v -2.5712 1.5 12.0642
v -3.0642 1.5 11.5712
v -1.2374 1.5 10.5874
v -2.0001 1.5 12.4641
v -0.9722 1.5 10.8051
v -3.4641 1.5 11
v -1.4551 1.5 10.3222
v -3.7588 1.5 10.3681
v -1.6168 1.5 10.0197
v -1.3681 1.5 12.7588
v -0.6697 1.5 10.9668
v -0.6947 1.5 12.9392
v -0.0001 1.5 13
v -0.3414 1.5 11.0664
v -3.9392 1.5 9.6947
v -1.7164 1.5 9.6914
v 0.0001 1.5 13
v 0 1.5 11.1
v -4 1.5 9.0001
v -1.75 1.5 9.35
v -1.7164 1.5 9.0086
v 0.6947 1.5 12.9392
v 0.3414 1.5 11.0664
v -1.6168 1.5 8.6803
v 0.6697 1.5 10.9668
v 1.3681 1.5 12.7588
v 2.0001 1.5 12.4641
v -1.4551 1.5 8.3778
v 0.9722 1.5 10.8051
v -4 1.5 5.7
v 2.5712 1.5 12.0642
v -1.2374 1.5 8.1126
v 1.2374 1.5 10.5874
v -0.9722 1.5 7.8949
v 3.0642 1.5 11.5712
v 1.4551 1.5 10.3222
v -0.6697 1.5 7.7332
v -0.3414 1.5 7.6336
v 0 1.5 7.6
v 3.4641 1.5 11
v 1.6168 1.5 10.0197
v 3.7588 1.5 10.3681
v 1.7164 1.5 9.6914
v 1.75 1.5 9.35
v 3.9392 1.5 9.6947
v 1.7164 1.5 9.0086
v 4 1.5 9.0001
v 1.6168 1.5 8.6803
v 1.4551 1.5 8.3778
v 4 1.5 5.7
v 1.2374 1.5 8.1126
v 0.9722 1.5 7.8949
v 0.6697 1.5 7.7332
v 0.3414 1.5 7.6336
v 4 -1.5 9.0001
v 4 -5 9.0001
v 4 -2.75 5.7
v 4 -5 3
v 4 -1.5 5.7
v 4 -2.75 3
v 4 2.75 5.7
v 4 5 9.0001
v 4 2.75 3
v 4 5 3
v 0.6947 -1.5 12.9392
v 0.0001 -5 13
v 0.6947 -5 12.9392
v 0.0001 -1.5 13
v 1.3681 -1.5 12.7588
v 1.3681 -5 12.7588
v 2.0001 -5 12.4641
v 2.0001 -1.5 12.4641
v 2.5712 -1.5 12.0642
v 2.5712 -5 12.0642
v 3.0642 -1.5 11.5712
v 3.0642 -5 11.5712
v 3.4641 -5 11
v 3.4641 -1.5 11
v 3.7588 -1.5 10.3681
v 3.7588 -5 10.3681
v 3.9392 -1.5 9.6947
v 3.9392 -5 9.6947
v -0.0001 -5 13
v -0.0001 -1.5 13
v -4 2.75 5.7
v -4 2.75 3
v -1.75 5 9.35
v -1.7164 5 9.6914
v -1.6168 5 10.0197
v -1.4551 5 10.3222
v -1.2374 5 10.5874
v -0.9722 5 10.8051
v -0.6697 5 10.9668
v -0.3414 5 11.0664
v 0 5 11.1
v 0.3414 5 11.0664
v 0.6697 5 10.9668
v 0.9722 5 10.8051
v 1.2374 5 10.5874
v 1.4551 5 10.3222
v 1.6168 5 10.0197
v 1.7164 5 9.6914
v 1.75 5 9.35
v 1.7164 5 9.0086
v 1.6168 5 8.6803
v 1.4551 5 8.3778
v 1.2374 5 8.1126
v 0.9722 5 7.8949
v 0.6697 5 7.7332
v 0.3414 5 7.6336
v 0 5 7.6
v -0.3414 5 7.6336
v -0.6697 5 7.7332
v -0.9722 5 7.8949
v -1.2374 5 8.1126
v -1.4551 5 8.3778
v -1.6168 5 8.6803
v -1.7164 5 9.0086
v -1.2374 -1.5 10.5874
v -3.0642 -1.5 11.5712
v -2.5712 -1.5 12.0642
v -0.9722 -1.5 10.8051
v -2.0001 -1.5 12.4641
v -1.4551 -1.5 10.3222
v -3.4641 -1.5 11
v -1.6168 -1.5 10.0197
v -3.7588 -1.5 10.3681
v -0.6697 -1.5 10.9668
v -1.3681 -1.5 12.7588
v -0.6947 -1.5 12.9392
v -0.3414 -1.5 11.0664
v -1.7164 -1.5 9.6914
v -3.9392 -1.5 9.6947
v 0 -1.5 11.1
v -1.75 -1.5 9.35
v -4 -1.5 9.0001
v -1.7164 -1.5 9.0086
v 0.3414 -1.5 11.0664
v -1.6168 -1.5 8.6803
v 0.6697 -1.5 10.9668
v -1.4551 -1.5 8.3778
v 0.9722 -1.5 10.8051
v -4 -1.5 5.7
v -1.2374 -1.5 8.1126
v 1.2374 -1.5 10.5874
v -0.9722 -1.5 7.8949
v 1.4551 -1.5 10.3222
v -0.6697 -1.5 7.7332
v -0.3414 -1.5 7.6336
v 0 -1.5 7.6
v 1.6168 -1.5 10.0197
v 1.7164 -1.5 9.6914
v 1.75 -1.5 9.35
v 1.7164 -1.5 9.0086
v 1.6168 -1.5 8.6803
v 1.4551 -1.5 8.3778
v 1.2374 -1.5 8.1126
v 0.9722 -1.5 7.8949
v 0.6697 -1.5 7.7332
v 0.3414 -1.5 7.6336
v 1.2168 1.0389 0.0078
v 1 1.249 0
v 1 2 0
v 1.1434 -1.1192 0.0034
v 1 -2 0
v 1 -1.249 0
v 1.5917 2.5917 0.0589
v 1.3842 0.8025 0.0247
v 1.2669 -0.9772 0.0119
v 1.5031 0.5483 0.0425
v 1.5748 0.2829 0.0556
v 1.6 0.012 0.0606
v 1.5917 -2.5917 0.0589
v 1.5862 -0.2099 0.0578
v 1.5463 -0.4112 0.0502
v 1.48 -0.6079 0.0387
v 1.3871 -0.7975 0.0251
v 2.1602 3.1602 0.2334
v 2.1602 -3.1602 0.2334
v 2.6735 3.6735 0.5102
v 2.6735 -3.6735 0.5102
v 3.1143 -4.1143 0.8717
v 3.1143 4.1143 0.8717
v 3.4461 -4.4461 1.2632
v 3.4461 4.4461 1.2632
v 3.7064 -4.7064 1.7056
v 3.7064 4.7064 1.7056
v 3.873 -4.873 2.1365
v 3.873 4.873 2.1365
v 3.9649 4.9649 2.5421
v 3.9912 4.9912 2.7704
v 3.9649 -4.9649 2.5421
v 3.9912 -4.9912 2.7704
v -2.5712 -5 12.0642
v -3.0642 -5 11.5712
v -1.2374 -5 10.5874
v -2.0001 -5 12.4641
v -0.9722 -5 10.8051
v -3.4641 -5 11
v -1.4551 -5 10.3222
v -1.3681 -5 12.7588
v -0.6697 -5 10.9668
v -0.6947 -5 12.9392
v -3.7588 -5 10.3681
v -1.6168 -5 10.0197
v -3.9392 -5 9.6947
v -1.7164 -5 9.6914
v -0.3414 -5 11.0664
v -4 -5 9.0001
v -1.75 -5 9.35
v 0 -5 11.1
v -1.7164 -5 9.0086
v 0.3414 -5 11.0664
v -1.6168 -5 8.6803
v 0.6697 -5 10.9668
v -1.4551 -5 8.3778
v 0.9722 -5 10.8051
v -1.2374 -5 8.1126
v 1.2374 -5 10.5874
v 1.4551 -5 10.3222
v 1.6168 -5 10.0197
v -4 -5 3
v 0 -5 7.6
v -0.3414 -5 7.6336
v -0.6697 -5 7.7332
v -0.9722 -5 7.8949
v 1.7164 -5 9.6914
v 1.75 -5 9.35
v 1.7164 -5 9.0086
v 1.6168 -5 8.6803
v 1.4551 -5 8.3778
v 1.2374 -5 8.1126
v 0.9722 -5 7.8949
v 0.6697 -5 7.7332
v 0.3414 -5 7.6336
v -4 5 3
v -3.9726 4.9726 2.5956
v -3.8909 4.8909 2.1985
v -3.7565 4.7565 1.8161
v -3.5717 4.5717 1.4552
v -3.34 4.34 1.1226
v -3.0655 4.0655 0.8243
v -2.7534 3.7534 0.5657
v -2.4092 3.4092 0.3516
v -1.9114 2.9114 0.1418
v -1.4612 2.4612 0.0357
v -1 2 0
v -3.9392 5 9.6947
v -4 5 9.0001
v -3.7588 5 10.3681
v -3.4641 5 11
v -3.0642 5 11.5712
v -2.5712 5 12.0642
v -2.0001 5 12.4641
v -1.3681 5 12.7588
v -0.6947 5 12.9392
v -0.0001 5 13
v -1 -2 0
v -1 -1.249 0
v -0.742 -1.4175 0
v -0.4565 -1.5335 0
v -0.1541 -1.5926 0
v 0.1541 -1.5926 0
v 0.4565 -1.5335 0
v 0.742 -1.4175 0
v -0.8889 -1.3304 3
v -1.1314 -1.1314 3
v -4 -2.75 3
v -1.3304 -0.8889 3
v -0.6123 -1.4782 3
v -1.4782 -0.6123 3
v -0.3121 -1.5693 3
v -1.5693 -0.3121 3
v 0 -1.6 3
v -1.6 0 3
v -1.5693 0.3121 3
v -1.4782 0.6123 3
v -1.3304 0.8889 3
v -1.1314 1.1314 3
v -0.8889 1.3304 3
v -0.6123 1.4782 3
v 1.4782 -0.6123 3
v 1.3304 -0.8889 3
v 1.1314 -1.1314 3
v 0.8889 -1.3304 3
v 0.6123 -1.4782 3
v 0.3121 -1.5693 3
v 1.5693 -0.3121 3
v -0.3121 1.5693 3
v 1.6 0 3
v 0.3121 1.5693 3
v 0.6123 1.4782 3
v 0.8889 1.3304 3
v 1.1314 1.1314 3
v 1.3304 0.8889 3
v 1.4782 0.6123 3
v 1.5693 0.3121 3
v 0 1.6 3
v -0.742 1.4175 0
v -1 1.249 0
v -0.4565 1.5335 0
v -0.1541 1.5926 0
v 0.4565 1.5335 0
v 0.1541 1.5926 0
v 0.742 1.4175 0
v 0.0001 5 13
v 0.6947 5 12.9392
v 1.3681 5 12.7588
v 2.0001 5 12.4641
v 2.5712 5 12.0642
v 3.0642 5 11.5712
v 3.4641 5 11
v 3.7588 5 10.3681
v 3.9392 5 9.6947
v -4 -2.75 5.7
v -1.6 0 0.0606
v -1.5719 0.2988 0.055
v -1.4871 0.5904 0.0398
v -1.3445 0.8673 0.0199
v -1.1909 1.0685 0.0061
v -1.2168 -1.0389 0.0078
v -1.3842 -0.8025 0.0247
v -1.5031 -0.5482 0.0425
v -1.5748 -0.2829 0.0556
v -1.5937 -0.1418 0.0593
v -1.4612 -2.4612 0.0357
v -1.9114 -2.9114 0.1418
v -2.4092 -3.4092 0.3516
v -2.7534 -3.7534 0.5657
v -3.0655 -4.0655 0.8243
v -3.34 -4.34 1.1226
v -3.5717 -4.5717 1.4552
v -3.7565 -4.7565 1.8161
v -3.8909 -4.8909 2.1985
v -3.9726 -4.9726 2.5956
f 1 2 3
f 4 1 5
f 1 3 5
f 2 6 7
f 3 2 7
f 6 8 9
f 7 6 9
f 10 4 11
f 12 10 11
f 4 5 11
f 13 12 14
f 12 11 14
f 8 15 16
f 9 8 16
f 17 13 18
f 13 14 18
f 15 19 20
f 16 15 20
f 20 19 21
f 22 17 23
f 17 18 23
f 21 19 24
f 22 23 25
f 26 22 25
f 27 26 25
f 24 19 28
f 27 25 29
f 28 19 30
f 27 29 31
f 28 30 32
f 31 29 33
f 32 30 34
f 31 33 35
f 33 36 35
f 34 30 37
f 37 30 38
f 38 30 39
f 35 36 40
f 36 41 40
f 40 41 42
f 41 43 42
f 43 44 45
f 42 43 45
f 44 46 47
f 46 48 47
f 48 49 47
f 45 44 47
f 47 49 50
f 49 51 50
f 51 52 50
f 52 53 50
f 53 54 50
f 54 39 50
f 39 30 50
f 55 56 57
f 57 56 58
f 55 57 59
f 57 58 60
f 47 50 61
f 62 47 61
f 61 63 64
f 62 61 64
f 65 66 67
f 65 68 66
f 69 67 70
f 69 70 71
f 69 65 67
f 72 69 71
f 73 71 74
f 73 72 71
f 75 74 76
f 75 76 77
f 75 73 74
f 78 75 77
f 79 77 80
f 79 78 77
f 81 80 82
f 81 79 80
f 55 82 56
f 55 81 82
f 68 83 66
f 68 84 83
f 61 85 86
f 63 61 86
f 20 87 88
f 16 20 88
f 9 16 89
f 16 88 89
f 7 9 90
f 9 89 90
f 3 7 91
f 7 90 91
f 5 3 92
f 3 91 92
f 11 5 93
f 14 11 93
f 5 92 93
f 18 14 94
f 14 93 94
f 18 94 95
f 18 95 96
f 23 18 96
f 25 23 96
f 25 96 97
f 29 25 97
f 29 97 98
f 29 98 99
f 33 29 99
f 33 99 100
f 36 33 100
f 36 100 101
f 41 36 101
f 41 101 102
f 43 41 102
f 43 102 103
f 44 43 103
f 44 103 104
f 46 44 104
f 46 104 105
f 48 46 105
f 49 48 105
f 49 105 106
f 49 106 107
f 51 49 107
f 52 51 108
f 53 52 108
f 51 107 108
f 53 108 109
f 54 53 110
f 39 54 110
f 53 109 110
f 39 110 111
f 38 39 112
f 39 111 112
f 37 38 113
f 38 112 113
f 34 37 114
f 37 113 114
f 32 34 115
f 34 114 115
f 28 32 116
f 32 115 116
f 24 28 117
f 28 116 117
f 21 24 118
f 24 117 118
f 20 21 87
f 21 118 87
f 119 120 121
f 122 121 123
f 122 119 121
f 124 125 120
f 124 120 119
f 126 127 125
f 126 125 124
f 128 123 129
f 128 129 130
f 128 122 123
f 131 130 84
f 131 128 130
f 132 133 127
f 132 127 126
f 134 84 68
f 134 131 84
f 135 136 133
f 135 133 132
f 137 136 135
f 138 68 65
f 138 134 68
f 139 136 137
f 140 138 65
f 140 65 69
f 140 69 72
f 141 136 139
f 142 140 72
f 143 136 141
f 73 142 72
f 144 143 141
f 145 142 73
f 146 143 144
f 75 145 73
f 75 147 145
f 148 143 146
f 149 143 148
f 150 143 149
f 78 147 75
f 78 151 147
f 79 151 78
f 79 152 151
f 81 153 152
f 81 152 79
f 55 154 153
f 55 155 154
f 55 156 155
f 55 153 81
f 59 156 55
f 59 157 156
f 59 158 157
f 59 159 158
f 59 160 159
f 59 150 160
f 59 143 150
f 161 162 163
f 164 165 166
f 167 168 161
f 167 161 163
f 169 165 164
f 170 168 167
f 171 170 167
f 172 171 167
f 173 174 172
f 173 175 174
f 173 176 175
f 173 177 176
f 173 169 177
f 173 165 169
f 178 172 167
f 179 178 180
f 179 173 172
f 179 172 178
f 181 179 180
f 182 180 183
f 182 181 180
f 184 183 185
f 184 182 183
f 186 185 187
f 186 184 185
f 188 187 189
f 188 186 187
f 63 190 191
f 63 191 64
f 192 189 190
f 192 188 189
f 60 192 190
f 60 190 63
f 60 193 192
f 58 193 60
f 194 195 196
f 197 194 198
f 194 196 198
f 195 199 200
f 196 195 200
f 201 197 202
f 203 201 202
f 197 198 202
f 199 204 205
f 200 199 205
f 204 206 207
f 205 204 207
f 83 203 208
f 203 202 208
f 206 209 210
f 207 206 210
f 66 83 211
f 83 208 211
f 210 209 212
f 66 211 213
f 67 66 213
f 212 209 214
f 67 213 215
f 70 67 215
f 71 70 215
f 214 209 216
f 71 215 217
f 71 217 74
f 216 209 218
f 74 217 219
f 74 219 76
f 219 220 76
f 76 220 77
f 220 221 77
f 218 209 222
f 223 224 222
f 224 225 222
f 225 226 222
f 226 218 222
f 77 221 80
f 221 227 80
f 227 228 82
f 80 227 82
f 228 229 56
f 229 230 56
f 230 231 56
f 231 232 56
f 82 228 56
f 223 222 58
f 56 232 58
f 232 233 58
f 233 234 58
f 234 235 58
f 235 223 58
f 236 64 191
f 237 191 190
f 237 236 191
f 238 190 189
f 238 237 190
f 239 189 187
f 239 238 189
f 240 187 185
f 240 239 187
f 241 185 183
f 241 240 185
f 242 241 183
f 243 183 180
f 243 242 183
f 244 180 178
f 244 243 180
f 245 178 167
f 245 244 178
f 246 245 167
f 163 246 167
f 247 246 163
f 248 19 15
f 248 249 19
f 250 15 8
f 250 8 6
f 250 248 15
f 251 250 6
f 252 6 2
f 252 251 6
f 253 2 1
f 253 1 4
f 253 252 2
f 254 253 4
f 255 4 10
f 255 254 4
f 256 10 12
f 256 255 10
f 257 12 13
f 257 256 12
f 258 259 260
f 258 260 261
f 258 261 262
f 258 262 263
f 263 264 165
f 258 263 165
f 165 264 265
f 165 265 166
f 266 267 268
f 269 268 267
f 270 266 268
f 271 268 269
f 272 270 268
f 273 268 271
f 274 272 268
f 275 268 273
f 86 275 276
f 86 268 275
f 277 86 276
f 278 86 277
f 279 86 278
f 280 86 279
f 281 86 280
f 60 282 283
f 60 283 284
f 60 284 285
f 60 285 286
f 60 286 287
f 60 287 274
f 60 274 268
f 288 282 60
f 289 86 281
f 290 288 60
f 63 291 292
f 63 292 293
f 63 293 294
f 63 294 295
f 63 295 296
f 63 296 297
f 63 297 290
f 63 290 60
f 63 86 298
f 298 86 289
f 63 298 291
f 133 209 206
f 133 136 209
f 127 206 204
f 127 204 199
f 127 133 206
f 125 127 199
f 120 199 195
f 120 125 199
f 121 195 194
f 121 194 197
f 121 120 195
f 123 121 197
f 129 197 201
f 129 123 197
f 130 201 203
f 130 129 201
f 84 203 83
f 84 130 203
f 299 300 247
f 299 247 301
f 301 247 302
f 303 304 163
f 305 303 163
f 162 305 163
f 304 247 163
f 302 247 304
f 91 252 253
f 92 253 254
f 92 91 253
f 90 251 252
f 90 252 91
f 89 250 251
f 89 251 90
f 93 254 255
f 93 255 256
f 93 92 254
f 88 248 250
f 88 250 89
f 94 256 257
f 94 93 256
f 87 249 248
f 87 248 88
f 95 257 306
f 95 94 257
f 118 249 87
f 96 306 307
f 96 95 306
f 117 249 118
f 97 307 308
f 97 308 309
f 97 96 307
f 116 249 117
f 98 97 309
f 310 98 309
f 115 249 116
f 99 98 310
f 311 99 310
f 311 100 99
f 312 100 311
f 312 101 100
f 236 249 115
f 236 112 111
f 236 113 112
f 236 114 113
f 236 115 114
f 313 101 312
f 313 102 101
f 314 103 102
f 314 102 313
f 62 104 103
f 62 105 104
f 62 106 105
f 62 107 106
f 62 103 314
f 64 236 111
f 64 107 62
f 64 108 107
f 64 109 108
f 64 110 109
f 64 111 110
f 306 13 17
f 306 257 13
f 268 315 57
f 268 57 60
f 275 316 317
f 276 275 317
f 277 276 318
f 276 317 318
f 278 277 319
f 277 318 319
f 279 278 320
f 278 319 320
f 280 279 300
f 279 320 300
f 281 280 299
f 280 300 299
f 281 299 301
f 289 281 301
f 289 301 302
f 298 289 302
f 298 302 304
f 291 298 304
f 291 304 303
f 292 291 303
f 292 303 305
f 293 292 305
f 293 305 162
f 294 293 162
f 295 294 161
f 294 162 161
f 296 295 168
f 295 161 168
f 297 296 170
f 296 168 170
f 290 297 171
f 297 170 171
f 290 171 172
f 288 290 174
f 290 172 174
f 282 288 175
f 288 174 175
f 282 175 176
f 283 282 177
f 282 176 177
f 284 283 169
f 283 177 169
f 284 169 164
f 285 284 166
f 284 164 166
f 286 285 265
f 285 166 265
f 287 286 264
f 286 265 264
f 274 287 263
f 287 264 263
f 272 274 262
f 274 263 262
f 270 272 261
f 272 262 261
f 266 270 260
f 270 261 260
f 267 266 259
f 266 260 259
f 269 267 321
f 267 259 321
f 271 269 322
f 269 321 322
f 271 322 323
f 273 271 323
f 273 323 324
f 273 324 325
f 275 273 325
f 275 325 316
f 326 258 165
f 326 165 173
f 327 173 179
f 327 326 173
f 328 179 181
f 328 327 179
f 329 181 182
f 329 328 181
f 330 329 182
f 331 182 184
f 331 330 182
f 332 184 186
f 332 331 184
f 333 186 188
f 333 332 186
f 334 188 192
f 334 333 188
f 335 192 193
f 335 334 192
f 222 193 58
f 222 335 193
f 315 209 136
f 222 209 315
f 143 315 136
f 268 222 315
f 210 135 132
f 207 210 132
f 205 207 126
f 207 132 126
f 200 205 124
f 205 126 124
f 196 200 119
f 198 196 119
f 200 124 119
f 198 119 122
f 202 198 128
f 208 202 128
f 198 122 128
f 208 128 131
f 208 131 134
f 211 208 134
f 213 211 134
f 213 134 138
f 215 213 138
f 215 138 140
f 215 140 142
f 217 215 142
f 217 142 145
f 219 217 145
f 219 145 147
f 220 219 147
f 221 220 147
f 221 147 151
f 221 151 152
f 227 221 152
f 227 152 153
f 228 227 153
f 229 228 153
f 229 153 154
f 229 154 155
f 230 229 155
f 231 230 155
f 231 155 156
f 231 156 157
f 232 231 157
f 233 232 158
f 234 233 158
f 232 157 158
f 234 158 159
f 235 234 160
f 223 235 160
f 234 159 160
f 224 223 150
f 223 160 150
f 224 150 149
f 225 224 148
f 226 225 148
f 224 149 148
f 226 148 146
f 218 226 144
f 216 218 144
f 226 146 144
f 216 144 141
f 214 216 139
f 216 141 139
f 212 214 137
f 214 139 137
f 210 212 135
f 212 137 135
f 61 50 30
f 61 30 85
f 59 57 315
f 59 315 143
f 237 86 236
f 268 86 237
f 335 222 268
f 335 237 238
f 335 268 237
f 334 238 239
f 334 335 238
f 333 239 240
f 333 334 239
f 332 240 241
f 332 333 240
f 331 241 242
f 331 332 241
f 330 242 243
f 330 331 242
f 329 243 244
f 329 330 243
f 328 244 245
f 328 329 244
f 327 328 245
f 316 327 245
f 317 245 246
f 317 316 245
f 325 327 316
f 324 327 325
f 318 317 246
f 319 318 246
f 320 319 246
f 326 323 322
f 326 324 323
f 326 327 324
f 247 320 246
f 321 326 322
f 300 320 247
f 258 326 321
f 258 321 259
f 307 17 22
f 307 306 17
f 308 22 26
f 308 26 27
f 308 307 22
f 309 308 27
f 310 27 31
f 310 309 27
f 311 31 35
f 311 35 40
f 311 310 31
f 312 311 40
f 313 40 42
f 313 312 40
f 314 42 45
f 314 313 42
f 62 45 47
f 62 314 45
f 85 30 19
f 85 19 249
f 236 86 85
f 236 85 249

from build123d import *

# Parameters (mm, degrees)
SKETCH1_W           = 8
SKETCH1_H           = 10
BOSS_EXTRUDE1_DEPTH = 3
SKETCH2_W           = 8
SKETCH2_H           = 3.5
BOSS_EXTRUDE2_DEPTH = 10
CUT_EXTRUDE1_START  = -8
SKETCH3_W           = 2.7
SKETCH3_H           = 5.5
CUT_EXTRUDE1_DEPTH  = 8
CUT_EXTRUDE2_REACH  = 16.491
SKETCH4_R           = 1.6
SKETCH5_R           = 1.75
CUT_EXTRUDE3_DEPTH  = 17.881943016
FILLET1_R           = 4
FILLET2_START       = -5
FILLET2_DEPTH       = 10
FILLET2_2_DEPTH     = 10


with BuildPart() as part:
    # Sketch1 → Boss-Extrude1 (new body)
    with BuildSketch(Plane.XY):
        Rectangle(SKETCH1_W, SKETCH1_H)
    extrude(amount=BOSS_EXTRUDE1_DEPTH)

    # Sketch2 → Boss-Extrude2 (add)
    with BuildSketch(Plane.XY.offset(3)):
        with Locations((0, 3.25)):
            Rectangle(SKETCH2_W, SKETCH2_H)
        with Locations((0, -3.25)):
            Rectangle(SKETCH2_W, SKETCH2_H)
    extrude(amount=BOSS_EXTRUDE2_DEPTH)

    # Sketch3 → Cut-Extrude1 (cut)
    with BuildSketch(Plane(origin=(4, 0, 0), x_dir=(0, 0, -1), z_dir=(1, 0, 0)).offset(CUT_EXTRUDE1_START)):
        with Locations((-4.35, 0)):
            Rectangle(SKETCH3_W, SKETCH3_H)
    extrude(amount=CUT_EXTRUDE1_DEPTH, mode=Mode.SUBTRACT)

    # Sketch4 → Cut-Extrude2 (cut, up to next)
    with BuildSketch(Plane(origin=(0, 0, 0), x_dir=(-1, 0, 0), z_dir=(0, 0, -1)), mode=Mode.PRIVATE) as cut_extrude2_sk1:
        Circle(SKETCH4_R)
    cut_extrude2_tool1 = extrude(cut_extrude2_sk1.sketch, amount=-CUT_EXTRUDE2_REACH, mode=Mode.PRIVATE) & part.part
    add(cut_extrude2_tool1.solids().sort_by_distance((0, 0, 0))[0], mode=Mode.SUBTRACT)

    # Sketch5 → Cut-Extrude3 (cut, through all)
    with BuildSketch(Plane(origin=(0, 5, 0), x_dir=(1, 0, 0), z_dir=(0, 1, 0))):
        with Locations(Location((0, -9.35, 0), (0, 0, 180))):
            Circle(SKETCH5_R)
    extrude(amount=-CUT_EXTRUDE3_DEPTH, mode=Mode.SUBTRACT)

    # Fillet1
    fillet1_edges = [part.edges().sort_by_distance(p)[0] for p in [
        (-4, -3.25, 13),
        (-4, 3.25, 13),
        (4, -3.25, 13),
        (4, 3.25, 13),
    ]]
    fillet(fillet1_edges, radius=FILLET1_R - 0.0001)  # a hair under: the kernel refuses the full size

    # Fillet2: read off the stored shape, not the designer's step
    # Fillet2 outline → Fillet2 (cut)
    with BuildSketch(Plane(origin=(0, 0, 0), x_dir=(1, 0, 0), z_dir=(0, 1, 0)).offset(FILLET2_START)):
        with BuildLine():
            ThreePointArc((-4, -3), (-3.121320344, -0.878679656), (-1, 0))
            Line((-1, 0), (-4, 0))
            Line((-4, 0), (-4, -3))
        make_face()
        with BuildLine():
            ThreePointArc((1, 0), (3.121320344, -0.878679656), (4, -3))
            Line((4, -3), (4, 0))
            Line((4, 0), (1, 0))
        make_face()
    extrude(amount=FILLET2_DEPTH, mode=Mode.SUBTRACT)

    # Fillet2 2 outline → Fillet2 2 (cut)
    with BuildSketch(Plane.YZ.offset(FILLET2_START)):
        with BuildLine():
            Line((5, 0), (5, 3))
            ThreePointArc((5, 3), (4.121320344, 0.878679656), (2, 0))
            Line((2, 0), (5, 0))
        make_face()
        with BuildLine():
            ThreePointArc((-2, 0), (-4.121320344, 0.878679656), (-5, 3))
            Line((-5, 3), (-5, 0))
            Line((-5, 0), (-2, 0))
        make_face()
    extrude(amount=FILLET2_2_DEPTH, mode=Mode.SUBTRACT)


solid = part.part
